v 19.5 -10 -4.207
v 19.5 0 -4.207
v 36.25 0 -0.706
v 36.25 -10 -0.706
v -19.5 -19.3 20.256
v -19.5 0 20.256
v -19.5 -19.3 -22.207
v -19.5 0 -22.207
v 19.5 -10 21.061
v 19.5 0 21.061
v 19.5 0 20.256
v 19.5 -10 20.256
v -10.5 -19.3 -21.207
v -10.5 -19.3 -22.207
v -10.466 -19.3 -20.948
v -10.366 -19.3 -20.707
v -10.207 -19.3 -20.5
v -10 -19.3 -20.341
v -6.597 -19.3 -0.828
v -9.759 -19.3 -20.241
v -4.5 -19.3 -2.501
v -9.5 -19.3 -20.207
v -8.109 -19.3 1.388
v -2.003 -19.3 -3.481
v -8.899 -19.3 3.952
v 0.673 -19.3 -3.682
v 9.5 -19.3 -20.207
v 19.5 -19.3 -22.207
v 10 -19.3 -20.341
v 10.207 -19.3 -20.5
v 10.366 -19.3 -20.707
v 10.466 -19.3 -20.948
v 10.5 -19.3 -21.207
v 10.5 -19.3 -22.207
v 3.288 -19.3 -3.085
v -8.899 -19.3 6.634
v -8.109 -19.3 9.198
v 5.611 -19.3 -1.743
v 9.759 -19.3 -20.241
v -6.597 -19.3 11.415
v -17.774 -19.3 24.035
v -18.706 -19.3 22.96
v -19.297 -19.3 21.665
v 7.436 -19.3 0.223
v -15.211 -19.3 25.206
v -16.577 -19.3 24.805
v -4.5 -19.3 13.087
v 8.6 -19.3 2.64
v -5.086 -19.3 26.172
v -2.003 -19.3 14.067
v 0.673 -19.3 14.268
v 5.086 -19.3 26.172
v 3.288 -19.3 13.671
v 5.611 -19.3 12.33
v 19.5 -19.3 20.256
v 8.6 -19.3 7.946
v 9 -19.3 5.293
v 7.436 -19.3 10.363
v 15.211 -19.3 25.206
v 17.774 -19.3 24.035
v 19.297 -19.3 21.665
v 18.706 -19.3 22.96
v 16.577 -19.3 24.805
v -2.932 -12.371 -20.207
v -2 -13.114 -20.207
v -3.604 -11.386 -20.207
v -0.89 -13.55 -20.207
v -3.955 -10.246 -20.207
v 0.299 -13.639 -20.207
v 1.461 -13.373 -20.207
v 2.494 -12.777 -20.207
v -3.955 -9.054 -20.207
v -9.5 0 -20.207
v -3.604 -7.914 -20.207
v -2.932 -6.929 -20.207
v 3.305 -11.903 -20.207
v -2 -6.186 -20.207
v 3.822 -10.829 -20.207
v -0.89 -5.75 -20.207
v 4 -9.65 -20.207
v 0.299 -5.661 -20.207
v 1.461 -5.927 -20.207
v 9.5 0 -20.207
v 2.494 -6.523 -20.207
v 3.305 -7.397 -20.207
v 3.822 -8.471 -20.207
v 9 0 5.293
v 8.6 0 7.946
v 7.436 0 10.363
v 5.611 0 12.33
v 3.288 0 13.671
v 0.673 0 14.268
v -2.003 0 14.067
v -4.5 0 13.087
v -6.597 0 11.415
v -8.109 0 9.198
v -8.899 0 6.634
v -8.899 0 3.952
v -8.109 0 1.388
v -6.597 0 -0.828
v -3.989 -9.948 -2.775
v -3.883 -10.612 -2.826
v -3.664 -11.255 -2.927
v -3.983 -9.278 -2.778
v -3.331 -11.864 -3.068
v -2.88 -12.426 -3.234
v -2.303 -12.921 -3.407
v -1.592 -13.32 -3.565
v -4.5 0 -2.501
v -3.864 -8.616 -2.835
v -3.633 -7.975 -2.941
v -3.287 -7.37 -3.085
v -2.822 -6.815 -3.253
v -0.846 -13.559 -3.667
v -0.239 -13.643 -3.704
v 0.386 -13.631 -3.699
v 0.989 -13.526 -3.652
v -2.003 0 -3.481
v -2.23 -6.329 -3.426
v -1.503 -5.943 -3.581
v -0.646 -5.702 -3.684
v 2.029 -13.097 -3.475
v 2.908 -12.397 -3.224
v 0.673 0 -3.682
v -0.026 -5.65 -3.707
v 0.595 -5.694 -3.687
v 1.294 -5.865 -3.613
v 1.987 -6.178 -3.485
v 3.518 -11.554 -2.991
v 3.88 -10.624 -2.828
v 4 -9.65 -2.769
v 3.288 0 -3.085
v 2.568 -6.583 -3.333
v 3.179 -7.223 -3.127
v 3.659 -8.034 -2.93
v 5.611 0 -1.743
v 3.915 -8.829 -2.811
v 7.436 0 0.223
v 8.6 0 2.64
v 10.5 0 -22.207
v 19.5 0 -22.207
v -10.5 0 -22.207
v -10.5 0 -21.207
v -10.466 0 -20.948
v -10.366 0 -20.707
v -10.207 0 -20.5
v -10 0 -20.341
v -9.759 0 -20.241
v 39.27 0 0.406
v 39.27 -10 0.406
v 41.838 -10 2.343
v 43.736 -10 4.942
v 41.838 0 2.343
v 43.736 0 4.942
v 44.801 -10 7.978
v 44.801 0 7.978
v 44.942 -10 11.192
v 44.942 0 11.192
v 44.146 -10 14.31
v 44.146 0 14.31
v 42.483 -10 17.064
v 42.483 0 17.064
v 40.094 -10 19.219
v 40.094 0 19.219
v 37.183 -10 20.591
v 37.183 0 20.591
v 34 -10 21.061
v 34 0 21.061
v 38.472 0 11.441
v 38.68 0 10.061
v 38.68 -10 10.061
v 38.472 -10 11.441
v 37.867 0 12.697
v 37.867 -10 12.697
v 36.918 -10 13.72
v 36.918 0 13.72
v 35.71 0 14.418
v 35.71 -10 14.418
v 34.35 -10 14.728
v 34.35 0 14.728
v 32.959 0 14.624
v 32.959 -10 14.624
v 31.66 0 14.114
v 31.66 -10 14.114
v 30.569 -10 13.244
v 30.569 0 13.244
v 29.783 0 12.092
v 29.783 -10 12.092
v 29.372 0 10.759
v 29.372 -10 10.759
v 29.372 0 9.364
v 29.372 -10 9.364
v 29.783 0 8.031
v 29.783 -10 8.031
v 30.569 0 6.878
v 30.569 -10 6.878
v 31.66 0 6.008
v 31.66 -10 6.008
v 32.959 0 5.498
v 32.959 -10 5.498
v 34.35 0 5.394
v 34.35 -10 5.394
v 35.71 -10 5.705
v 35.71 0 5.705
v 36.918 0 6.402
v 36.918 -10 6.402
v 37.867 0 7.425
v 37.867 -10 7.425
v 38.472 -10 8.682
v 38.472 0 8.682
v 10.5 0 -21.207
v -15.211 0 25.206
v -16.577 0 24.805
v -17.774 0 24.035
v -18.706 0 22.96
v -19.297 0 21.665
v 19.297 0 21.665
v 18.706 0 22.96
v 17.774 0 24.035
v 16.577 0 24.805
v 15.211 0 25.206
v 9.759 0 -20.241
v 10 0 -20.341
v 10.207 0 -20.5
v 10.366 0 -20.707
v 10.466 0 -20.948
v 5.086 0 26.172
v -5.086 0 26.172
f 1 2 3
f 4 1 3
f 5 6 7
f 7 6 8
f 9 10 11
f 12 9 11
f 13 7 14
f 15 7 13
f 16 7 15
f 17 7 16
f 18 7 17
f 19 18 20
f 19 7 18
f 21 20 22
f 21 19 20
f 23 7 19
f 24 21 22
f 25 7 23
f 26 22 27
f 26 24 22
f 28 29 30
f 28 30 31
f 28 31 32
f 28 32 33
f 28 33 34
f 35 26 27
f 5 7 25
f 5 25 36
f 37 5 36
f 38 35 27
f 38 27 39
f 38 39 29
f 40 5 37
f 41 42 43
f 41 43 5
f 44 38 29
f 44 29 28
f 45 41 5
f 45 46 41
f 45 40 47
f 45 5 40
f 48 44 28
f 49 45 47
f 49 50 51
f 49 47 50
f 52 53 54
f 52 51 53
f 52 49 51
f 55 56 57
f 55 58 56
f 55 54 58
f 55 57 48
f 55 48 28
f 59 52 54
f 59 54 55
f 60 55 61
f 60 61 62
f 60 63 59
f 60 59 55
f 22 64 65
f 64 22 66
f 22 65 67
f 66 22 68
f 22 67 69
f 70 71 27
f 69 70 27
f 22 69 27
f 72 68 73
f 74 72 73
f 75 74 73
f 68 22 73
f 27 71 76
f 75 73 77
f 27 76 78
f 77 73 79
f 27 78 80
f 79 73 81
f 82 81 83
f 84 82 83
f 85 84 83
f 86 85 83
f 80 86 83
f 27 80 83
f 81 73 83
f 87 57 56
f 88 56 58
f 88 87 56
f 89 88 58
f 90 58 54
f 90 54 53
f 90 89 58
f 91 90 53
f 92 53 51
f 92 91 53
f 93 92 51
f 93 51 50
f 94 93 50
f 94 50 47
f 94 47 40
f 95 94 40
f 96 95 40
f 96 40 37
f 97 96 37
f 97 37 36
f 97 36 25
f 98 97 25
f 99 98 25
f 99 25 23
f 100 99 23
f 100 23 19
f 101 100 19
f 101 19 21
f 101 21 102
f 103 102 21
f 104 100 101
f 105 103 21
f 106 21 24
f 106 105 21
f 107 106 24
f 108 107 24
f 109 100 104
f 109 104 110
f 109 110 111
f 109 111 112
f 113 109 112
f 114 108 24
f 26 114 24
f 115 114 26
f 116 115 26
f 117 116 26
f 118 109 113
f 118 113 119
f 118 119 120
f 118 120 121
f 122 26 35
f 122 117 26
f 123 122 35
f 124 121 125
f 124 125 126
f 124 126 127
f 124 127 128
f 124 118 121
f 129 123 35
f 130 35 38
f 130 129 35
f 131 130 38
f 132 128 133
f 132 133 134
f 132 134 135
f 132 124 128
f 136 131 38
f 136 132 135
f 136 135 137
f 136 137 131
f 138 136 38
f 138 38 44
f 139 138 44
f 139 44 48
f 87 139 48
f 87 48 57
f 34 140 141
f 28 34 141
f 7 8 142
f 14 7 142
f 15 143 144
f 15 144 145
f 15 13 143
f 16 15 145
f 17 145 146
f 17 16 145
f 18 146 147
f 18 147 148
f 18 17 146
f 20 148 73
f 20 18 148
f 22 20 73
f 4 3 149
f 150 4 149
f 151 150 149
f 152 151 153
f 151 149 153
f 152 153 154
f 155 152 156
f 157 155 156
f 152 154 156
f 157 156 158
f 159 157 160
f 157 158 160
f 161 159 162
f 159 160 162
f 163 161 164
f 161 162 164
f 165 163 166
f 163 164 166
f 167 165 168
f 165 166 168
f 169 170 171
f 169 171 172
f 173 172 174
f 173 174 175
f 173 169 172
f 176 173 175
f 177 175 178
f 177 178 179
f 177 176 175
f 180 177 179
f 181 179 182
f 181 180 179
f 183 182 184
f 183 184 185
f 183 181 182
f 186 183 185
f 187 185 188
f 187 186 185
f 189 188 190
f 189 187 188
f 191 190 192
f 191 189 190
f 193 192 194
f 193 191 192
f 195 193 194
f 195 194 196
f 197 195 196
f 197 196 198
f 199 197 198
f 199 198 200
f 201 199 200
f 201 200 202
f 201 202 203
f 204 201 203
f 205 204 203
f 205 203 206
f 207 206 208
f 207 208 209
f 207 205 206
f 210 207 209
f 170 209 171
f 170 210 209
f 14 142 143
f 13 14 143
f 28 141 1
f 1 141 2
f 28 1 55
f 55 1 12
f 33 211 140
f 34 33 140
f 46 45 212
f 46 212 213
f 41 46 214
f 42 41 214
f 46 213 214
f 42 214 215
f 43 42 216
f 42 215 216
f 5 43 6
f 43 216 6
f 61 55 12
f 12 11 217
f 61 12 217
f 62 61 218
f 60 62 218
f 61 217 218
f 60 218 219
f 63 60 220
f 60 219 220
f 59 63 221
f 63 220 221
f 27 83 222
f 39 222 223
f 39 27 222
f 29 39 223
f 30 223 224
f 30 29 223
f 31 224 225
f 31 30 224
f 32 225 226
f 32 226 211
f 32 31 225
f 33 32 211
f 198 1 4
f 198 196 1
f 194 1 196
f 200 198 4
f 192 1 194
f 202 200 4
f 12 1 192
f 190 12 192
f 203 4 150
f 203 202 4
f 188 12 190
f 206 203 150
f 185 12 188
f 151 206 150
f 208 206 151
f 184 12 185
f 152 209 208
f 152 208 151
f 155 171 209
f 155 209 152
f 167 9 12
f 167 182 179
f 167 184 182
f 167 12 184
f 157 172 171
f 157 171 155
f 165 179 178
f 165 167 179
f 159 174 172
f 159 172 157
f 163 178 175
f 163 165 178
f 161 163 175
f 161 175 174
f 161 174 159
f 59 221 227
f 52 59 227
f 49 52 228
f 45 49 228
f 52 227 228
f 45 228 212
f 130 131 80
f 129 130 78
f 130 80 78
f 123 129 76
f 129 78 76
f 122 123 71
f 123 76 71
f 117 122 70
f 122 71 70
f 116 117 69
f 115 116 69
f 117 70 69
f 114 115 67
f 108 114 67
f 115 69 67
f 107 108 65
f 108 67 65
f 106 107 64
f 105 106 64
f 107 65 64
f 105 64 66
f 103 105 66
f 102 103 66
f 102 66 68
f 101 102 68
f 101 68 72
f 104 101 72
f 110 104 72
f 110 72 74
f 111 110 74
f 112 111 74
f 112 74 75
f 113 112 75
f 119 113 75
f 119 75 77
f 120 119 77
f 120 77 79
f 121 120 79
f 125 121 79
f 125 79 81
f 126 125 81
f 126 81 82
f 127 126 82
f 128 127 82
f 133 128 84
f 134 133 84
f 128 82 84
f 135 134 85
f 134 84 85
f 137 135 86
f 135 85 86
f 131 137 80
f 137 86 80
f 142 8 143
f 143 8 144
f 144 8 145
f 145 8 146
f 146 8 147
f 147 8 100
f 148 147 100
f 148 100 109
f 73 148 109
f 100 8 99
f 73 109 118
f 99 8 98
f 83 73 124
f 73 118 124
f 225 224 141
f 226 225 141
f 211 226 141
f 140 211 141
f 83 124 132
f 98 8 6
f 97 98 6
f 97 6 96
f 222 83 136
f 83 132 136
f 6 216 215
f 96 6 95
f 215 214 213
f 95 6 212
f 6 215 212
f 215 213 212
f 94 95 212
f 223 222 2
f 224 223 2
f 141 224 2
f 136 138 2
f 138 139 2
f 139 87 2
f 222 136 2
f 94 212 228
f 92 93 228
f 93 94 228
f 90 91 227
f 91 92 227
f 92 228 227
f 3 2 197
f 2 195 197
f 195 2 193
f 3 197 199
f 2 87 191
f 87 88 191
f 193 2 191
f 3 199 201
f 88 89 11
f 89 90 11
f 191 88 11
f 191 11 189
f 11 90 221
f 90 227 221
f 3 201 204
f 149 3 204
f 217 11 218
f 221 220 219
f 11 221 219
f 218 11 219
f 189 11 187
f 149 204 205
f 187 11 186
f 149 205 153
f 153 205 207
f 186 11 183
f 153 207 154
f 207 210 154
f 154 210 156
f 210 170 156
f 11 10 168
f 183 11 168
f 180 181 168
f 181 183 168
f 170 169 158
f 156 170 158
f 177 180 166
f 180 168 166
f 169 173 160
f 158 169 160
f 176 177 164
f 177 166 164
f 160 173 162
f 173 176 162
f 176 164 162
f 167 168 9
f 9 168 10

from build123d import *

# Parameters (mm, degrees)
F0_R     = 9
F1_DEPTH = 19.3
F2_R     = 1
F3_R     = 4.68
F4_DEPTH = 10
F5_R     = 4
F6_DEPTH = 25


with BuildPart() as f1:
    # F0 (on Front) → F1 (new body)
    with BuildSketch(Plane.XZ):
        with BuildLine():
            ThreePointArc((-15.21127, 25.205598), (-18.278647, 23.530867), (-19.5, 20.256447))
            Line((-19.5, 20.256447), (-19.5, -22.20694))
            Line((-19.5, -22.20694), (-10.5, -22.20694))
            Line((-10.5, -22.20694), (-10.5, -20.20694))
            Line((-10.5, -20.20694), (10.5, -20.20694))
            Line((10.5, -20.20694), (10.5, -22.20694))
            Line((10.5, -22.20694), (19.5, -22.20694))
            Line((19.5, -22.20694), (19.5, 20.256447))
            ThreePointArc((19.5, 20.256447), (18.278647, 23.530867), (15.21127, 25.205598))
            ThreePointArc((15.21127, 25.205598), (0, 26.29306), (-15.21127, 25.205598))
        make_face()
        with Locations((0, 5.29306)):
            Circle(F0_R, mode=Mode.SUBTRACT)
    extrude(amount=F1_DEPTH)

    # F2
    f2_edges = [f1.edges().sort_by_distance(p)[0] for p in [
        (-10.5, -9.65, -20.20694),
        (10.5, -9.65, -20.20694),
    ]]
    fillet(f2_edges, radius=F2_R)

    # F3 (on Front) → F4 (join)
    with BuildSketch(Plane.XZ):
        with BuildLine():
            Line((34, 21.061159), (19.5, 21.061159))
            Line((19.5, 21.061159), (19.5, -4.20694))
            Line((19.5, -4.20694), (36.250328, -0.7062))
            ThreePointArc((36.250328, -0.7062), (44.941685, 11.192319), (34, 21.061159))
        make_face()
        with Locations((34, 10.061159)):
            Circle(F3_R, mode=Mode.SUBTRACT)
    extrude(amount=F4_DEPTH)

    # F5 (on face) → F6 (cut)
    with BuildSketch(Plane(origin=(0, 0, -20.20694), x_dir=(1, 0, 0), z_dir=(0, 0, -1))):
        with Locations((0, 9.65)):
            Circle(F5_R)
    extrude(amount=-F6_DEPTH, mode=Mode.SUBTRACT)


solid = f1.part
